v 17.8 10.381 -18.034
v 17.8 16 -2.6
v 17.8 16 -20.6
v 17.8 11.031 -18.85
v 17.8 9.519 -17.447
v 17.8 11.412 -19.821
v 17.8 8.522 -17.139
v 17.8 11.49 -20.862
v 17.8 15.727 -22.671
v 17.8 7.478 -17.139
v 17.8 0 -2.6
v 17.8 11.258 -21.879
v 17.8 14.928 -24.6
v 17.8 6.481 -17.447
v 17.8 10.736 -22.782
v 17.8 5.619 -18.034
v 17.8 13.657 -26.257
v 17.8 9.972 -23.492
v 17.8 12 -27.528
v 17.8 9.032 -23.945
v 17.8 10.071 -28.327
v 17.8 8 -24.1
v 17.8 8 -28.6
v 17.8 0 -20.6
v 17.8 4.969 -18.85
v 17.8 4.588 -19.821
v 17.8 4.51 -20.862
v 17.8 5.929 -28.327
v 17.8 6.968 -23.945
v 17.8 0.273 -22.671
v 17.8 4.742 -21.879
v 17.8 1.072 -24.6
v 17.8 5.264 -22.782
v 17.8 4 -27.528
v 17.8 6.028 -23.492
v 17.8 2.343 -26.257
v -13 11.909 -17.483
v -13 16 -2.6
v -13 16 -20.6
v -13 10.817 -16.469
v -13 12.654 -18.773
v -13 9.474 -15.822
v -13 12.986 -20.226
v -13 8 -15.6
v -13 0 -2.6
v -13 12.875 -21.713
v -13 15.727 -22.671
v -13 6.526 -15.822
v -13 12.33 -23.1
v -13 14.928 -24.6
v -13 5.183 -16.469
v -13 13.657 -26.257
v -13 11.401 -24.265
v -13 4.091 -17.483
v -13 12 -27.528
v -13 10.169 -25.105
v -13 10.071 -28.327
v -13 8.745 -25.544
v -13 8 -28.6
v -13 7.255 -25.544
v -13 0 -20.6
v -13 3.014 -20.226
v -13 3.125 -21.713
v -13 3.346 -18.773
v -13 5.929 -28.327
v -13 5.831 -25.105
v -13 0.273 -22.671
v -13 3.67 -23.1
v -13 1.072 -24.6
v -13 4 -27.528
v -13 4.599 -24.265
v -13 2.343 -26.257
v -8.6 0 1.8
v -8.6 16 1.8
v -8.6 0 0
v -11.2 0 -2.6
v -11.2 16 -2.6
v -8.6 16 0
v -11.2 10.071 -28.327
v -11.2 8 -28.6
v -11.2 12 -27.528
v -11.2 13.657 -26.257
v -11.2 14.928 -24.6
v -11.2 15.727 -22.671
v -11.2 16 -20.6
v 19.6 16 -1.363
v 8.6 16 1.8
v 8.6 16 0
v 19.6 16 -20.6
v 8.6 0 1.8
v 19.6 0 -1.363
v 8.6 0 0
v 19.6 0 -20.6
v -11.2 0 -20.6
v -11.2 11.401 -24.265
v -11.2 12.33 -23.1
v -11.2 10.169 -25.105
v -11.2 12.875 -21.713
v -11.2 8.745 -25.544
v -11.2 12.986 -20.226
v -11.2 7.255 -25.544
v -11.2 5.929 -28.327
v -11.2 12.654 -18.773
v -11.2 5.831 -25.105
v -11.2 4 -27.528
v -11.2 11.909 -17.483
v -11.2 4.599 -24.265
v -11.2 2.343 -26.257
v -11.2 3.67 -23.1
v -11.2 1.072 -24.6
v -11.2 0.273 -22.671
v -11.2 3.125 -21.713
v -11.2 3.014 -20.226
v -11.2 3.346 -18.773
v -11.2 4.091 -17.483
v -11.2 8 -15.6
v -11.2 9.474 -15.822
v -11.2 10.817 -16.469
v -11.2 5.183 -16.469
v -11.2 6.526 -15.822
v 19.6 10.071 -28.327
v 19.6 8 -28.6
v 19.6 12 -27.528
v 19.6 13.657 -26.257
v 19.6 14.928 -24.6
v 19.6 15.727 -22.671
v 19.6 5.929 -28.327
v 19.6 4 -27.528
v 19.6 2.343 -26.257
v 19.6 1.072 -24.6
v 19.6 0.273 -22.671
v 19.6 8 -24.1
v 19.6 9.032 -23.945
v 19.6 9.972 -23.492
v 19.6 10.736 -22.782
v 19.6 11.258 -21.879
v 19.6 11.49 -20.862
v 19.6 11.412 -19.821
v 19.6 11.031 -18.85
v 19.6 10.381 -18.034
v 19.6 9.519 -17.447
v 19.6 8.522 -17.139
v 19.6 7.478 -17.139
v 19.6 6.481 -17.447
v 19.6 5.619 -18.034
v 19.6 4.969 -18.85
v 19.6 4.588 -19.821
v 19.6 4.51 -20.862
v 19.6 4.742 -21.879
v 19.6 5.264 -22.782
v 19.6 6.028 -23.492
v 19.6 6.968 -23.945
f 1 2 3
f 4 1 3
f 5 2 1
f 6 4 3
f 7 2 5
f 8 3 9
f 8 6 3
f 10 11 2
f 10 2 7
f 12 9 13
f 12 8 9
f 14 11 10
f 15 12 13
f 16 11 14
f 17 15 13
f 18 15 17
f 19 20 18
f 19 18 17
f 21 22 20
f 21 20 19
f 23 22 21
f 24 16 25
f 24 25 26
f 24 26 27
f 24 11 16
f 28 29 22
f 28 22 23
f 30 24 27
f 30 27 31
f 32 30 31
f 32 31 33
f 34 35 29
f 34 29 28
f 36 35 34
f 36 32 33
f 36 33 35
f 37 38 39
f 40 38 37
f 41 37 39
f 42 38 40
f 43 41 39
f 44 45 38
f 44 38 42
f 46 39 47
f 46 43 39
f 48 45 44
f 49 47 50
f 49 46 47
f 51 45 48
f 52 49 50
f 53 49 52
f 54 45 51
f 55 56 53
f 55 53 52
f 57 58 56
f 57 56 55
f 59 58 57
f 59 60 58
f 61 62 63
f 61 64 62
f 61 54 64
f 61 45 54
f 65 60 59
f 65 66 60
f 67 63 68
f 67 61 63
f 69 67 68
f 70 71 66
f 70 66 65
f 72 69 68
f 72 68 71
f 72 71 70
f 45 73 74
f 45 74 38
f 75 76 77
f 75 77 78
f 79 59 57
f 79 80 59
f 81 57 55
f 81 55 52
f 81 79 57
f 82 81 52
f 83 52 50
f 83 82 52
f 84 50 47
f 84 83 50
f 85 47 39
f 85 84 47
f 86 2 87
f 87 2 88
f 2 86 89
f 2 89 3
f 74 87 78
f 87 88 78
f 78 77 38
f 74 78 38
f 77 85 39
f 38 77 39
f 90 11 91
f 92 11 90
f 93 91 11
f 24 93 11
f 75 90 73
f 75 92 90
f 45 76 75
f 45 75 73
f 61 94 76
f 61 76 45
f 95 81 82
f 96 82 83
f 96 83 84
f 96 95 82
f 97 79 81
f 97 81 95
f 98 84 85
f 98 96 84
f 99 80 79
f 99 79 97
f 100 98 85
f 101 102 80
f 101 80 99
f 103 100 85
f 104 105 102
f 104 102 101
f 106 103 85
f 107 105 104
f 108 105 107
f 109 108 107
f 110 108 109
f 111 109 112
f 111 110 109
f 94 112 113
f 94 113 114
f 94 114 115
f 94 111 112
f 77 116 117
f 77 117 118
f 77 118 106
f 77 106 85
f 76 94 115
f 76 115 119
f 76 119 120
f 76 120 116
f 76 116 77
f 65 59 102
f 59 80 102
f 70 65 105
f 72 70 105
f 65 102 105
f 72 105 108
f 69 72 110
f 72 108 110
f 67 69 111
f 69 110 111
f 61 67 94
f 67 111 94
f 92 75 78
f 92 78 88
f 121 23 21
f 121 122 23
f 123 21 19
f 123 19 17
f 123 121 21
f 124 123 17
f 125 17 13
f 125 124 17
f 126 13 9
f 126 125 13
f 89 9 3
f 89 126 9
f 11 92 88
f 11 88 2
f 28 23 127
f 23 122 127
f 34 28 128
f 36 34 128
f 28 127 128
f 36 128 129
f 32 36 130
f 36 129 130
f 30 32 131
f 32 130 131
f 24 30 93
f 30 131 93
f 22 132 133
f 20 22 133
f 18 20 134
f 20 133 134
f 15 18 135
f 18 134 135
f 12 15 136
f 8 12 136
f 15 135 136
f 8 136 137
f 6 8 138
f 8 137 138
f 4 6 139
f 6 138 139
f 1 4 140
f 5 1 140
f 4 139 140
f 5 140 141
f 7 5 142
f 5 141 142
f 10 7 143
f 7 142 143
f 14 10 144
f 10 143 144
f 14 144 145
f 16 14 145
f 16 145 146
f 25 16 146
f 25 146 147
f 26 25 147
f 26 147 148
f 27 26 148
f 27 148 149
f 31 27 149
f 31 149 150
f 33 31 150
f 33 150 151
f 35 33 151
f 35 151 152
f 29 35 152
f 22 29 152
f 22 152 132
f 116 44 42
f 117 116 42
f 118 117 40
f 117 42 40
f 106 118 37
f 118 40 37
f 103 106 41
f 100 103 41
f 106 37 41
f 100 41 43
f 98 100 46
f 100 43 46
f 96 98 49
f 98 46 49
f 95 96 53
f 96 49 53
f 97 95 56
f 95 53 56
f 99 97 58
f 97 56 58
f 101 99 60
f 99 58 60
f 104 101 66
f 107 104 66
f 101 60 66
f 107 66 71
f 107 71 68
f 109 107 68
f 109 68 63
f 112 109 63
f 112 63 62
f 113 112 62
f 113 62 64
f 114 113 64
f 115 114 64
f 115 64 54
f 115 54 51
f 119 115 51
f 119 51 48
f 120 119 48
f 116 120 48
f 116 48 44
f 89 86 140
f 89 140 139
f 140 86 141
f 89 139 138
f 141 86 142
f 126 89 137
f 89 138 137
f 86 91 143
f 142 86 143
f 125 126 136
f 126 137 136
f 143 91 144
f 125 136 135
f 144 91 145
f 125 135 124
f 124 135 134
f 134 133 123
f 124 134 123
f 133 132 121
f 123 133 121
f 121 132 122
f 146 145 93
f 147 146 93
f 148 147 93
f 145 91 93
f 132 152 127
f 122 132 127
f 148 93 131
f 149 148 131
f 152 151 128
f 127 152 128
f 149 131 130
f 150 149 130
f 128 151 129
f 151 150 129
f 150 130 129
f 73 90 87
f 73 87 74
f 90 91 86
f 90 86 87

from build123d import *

# Parameters (mm, degrees)
EXTRUDE_1_DEPTH     = 16
FILLET_2_R          = 8
SKETCH_2_R          = 5
CUT_EXTRUDE_1_DEPTH = 2
SKETCH_3_R          = 3.5
CUT_EXTRUDE_2_DEPTH = 2


with BuildPart() as part:
    # 草图1 → 凸台-拉伸1 (new body)
    with BuildSketch(Plane(origin=(0, 0, 0), x_dir=(1, 0, 0), z_dir=(0, 1, 0))):
        Polygon((-8.6, 0), (8.6, 0), (17.8, 2.6), (17.8, 28.6), (19.6, 28.6), (19.6, 2.6), (19.6, 1.363414634), (8.6, -1.8), (-8.6, -1.8), (-13, 2.6), (-13, 28.6), (-11.2, 28.6), (-11.2, 2.6), align=None)
    extrude(amount=EXTRUDE_1_DEPTH)

    # 圆角2
    fillet_2_edges = [part.edges().sort_by_distance(p)[0] for p in [
        (18.7, 0, -28.6),
        (18.7, 16, -28.6),
        (-12.1, 0, -28.6),
        (-12.1, 16, -28.6),
    ]]
    fillet(fillet_2_edges, radius=FILLET_2_R - 0.0001)  # a hair under: the kernel refuses the full size

    # 草图2 → 切除-拉伸1 (cut)
    with BuildSketch(Plane.ZY.offset(13)):
        with Locations((-20.6, 8)):
            Circle(SKETCH_2_R)
    extrude(amount=-CUT_EXTRUDE_1_DEPTH, mode=Mode.SUBTRACT)

    # 草图3 → 切除-拉伸2 (cut)
    with BuildSketch(Plane(origin=(19.6, 0, 0), x_dir=(0, 0, -1), z_dir=(1, 0, 0))):
        with Locations((20.6, 8)):
            Circle(SKETCH_3_R)
    extrude(amount=-CUT_EXTRUDE_2_DEPTH, mode=Mode.SUBTRACT)


solid = part.part
